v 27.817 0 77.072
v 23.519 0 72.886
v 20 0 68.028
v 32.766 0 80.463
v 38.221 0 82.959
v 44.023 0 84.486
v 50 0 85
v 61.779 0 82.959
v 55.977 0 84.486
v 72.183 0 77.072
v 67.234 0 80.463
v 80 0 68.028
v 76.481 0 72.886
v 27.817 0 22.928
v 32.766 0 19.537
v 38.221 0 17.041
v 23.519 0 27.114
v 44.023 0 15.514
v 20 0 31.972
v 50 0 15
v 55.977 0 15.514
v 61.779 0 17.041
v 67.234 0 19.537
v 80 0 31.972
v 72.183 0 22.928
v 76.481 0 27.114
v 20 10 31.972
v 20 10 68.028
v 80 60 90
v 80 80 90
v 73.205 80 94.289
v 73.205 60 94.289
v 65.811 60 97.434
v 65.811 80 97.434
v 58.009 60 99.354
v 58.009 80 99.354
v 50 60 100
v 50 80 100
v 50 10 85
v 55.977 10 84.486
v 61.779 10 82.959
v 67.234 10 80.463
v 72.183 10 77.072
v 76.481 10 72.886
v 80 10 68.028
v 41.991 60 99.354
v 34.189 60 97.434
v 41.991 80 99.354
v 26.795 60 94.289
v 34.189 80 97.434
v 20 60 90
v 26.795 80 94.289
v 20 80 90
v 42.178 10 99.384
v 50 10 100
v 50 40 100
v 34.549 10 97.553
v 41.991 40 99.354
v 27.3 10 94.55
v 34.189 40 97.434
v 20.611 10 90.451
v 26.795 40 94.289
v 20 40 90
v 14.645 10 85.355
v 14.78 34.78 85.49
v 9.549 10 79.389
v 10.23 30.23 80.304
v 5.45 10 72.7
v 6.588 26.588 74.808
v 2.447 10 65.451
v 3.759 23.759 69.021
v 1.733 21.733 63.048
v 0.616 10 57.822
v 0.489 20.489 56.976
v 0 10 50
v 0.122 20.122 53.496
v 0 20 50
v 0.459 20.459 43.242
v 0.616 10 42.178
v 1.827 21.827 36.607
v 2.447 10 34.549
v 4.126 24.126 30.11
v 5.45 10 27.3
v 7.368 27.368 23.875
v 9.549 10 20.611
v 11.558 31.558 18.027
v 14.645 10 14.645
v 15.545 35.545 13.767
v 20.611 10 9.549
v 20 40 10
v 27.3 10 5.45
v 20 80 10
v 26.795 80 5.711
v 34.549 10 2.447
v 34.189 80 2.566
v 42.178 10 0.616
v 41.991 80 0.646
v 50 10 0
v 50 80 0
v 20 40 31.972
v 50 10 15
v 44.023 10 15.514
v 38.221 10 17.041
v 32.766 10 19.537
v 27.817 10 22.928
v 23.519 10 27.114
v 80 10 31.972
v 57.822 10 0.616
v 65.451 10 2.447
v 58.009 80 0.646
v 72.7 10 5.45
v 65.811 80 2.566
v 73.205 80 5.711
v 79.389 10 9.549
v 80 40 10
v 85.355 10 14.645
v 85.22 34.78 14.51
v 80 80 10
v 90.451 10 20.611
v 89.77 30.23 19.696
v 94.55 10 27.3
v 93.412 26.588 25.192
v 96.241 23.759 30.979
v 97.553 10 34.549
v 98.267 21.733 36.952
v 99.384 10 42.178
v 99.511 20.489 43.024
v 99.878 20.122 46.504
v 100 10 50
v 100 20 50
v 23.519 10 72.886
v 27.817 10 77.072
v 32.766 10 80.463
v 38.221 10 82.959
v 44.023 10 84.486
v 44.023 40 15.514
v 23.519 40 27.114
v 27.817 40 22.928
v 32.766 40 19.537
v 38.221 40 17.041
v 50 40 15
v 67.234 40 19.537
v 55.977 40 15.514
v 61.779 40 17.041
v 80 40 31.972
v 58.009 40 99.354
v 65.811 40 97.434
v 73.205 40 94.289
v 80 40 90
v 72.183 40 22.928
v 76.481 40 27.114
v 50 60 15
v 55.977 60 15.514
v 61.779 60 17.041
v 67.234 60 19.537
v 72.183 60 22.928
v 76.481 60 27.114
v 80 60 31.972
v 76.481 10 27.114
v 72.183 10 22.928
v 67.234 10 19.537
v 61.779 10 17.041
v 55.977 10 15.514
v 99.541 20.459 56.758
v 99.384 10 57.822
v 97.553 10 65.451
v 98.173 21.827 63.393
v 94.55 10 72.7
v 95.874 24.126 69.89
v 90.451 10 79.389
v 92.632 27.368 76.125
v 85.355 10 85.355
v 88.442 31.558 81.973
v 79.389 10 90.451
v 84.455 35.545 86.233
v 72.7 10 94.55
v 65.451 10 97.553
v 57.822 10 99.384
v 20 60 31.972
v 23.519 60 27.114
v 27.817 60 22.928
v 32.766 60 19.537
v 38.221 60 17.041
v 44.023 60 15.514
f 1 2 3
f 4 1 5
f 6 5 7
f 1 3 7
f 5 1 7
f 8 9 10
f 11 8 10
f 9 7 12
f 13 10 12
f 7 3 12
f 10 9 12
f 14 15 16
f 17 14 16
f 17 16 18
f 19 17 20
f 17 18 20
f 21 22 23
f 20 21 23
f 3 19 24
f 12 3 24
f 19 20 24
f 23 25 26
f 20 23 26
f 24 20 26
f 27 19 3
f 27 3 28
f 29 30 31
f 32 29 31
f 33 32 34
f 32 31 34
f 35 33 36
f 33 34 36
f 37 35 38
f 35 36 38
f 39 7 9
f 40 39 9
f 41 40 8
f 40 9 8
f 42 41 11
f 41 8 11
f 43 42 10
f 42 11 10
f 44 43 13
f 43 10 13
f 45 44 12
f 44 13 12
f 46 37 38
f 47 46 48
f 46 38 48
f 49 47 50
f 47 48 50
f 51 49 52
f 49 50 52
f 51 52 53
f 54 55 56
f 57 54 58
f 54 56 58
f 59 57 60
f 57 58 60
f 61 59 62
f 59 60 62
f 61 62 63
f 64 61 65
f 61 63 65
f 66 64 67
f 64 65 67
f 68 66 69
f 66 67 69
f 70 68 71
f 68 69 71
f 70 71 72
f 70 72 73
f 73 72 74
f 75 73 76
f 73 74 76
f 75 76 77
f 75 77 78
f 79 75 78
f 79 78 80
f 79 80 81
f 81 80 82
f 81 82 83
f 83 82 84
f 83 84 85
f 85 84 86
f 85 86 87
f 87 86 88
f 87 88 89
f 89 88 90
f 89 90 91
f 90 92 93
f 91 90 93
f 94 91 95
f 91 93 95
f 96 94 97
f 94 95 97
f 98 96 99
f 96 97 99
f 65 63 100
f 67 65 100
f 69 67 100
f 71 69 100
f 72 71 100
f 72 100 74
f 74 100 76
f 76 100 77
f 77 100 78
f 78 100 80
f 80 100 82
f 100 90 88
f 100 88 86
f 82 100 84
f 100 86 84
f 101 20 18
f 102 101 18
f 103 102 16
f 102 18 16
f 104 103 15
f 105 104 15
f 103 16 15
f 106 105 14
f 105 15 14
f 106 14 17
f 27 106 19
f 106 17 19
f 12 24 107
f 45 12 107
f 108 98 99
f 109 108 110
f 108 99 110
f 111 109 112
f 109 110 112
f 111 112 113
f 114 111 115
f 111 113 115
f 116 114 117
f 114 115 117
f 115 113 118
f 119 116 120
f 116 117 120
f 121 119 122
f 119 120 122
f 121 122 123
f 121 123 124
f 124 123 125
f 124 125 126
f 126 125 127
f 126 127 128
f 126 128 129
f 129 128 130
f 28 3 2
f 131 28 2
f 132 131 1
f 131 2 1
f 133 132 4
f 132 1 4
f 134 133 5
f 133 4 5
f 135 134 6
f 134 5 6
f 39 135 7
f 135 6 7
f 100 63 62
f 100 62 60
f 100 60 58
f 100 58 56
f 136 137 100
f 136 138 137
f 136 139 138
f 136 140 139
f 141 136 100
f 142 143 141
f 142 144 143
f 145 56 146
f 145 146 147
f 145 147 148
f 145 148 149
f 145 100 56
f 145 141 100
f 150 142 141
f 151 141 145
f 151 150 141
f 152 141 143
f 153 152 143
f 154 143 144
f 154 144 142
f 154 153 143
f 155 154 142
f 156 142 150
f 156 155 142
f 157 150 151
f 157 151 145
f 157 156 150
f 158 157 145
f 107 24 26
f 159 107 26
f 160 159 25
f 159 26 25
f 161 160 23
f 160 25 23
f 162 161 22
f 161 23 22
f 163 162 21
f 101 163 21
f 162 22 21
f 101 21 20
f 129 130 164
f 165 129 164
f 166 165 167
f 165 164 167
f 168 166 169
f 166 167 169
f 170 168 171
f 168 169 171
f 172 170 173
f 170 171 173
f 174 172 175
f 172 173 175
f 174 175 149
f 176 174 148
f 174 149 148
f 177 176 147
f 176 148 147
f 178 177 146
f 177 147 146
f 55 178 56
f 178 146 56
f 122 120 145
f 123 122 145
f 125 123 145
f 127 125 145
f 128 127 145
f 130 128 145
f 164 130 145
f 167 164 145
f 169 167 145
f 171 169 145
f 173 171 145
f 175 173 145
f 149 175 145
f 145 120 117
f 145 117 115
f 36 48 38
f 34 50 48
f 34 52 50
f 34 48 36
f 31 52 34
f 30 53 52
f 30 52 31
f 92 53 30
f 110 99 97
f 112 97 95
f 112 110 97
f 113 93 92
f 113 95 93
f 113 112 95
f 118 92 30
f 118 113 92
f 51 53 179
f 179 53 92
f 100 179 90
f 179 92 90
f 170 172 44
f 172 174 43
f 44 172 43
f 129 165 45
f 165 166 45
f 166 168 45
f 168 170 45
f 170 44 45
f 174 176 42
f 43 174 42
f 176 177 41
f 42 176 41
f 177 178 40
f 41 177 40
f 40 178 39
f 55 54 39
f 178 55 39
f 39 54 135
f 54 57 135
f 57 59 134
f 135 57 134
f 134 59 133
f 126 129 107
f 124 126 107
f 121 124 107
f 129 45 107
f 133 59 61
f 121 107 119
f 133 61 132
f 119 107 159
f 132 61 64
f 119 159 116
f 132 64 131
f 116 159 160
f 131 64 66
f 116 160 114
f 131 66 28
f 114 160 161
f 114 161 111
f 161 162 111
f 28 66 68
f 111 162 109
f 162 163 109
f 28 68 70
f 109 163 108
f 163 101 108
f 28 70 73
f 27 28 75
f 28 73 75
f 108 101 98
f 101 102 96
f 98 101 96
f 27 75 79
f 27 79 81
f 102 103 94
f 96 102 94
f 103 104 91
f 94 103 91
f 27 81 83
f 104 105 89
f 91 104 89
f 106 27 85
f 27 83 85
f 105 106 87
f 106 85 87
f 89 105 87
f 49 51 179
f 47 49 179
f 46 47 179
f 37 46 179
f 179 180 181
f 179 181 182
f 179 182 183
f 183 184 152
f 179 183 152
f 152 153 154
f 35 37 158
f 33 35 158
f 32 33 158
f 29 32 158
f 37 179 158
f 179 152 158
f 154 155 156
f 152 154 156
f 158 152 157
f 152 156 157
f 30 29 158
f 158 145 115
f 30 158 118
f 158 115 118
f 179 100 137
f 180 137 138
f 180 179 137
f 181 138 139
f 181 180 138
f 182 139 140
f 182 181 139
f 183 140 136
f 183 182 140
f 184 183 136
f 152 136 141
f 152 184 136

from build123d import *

# Parameters (mm, degrees)
SKETCH1_W           = 100
SKETCH1_H           = 80
BOSS_EXTRUDE2_DEPTH = 100
SKETCH2_W           = 20
SKETCH2_H           = 10
CUT_EXTRUDE1_DEPTH  = 100
CUT_EXTRUDE2_DEPTH  = 100
SKETCH4_W           = 15
SKETCH4_H           = 10
CUT_EXTRUDE5_DEPTH  = 100
SKETCH7_R           = 35
CUT_EXTRUDE16_DEPTH = 20
BOSS_EXTRUDE3_DEPTH = 40
CUT_EXTRUDE17_DEPTH = 10
SKETCH18_W          = 60
SKETCH18_H          = 20
CUT_EXTRUDE22_DEPTH = 75


with BuildPart() as part:
    # Sketch1 → Boss-Extrude2 (new body)
    with BuildSketch(Plane.XY):
        with Locations((50, 40)):
            Rectangle(SKETCH1_W, SKETCH1_H)
    extrude(amount=BOSS_EXTRUDE2_DEPTH)

    # Sketch2 → Cut-Extrude1 (cut)
    with BuildSketch(Plane.XY):
        Polygon((0, 80), (20, 80), (20, 40), (0, 20), align=None)
        with Locations((10, 5)):
            Rectangle(SKETCH2_W, SKETCH2_H)
        with Locations((90, 5)):
            Rectangle(SKETCH2_W, SKETCH2_H)
        Polygon((80, 80), (100, 80), (100, 20), (80, 40), align=None)
    extrude(amount=CUT_EXTRUDE1_DEPTH, mode=Mode.SUBTRACT)

    # Sketch3 → Cut-Extrude2 (cut)
    with BuildSketch(Plane(origin=(0, 80, 0), x_dir=(1, 0, 0), z_dir=(0, 1, 0))):
        with BuildLine():
            Line((0, 0), (0, -50))
            ThreePointArc((0, -50), (14.644660941, -14.644660941), (50, 0))
            Line((50, 0), (0, 0))
        make_face()
        with BuildLine():
            Line((100, 0), (50, 0))
            ThreePointArc((50, 0), (85.355339059, -14.644660941), (100, -50))
            Line((100, -50), (100, 0))
        make_face()
        with BuildLine():
            ThreePointArc((100, -50), (85.355339059, -85.355339059), (50, -100))
            Line((50, -100), (100, -100))
            Line((100, -100), (100, -50))
        make_face()
        with BuildLine():
            ThreePointArc((50, -100), (14.644660941, -85.355339059), (0, -50))
            Line((0, -50), (0, -100))
            Line((0, -100), (50, -100))
        make_face()
    extrude(amount=-CUT_EXTRUDE2_DEPTH, mode=Mode.SUBTRACT)

    # Sketch4 → Cut-Extrude5 (cut)
    with BuildSketch(Plane(origin=(0, 0, 0), x_dir=(0, 0, -1), z_dir=(1, 0, 0))):
        with Locations((-7.5, 5)):
            Rectangle(SKETCH4_W, SKETCH4_H)
        with Locations((-92.5, 5)):
            Rectangle(SKETCH4_W, SKETCH4_H)
    extrude(amount=CUT_EXTRUDE5_DEPTH, mode=Mode.SUBTRACT)

    # Sketch7 → Cut-Extrude16 (cut)
    with BuildSketch(Plane(origin=(0, 60, 0), x_dir=(1, 0, 0), z_dir=(0, 1, 0))):
        with BuildLine():
            Line((15, -85), (50, -85))
            ThreePointArc((50, -85), (25.251262658, -74.748737342), (15, -50))
            Line((15, -50), (15, -85))
        make_face()
        with BuildLine():
            ThreePointArc((50, -15), (74.748737342, -25.251262658), (85, -50))
            Line((85, -50), (85, -15))
            Line((85, -15), (50, -15))
        make_face()
        with BuildLine():
            ThreePointArc((85, -50), (74.748737342, -74.748737342), (50, -85))
            Line((50, -85), (85, -85))
            Line((85, -85), (85, -50))
        make_face()
        with BuildLine():
            Line((15, -15), (15, -50))
            ThreePointArc((15, -50), (25.251262658, -25.251262658), (50, -15))
            Line((50, -15), (15, -15))
        make_face()
        with Locations((50, -50)):
            Circle(SKETCH7_R)
    extrude(amount=-CUT_EXTRUDE16_DEPTH, mode=Mode.SUBTRACT)

    # Sketch8 → Boss-Extrude3 (add)
    with BuildSketch(Plane(origin=(0, 80, 0), x_dir=(1, 0, 0), z_dir=(0, 1, 0))):
        with BuildLine():
            ThreePointArc((20, -31.972243623), (32.765898242, -19.537141687), (50, -15))
            Line((50, -15), (20, -15))
            Line((20, -15), (20, -31.972243623))
        make_face()
        with BuildLine():
            Line((80, -15), (50, -15))
            ThreePointArc((50, -15), (67.234101758, -19.537141687), (80, -31.972243623))
            Line((80, -31.972243623), (80, -15))
        make_face()
        with BuildLine():
            ThreePointArc((50, -85), (32.765898242, -80.462858313), (20, -68.027756377))
            Line((20, -68.027756377), (20, -85))
            Line((20, -85), (50, -85))
        make_face()
        with BuildLine():
            Line((80, -85), (80, -68.027756377))
            ThreePointArc((80, -68.027756377), (67.234101758, -80.462858313), (50, -85))
            Line((50, -85), (80, -85))
        make_face()
    extrude(amount=-BOSS_EXTRUDE3_DEPTH)

    # Sketch9 → Cut-Extrude17 (cut)
    with BuildSketch(Plane.XZ):
        with BuildLine():
            Line((20, 85), (20, 68.027756377))
            ThreePointArc((20, 68.027756377), (32.765898242, 80.462858313), (50, 85))
            Line((50, 85), (20, 85))
        make_face()
        with BuildLine():
            Line((80, 85), (50, 85))
            ThreePointArc((50, 85), (67.234101758, 80.462858313), (80, 68.027756377))
            Line((80, 68.027756377), (80, 85))
        make_face()
        with BuildLine():
            ThreePointArc((80, 31.972243623), (67.234101758, 19.537141687), (50, 15))
            Line((50, 15), (80, 15))
            Line((80, 15), (80, 31.972243623))
        make_face()
        with BuildLine():
            ThreePointArc((50, 15), (32.765898242, 19.537141687), (20, 31.972243623))
            Line((20, 31.972243623), (20, 15))
            Line((20, 15), (50, 15))
        make_face()
    extrude(amount=-CUT_EXTRUDE17_DEPTH, mode=Mode.SUBTRACT)

    # Sketch18 → Cut-Extrude22 (cut)
    with BuildSketch(Plane.XY.offset(50)):
        with Locations((50, 50)):
            Rectangle(SKETCH18_W, SKETCH18_H)
    extrude(amount=CUT_EXTRUDE22_DEPTH, mode=Mode.SUBTRACT)


solid = part.part
